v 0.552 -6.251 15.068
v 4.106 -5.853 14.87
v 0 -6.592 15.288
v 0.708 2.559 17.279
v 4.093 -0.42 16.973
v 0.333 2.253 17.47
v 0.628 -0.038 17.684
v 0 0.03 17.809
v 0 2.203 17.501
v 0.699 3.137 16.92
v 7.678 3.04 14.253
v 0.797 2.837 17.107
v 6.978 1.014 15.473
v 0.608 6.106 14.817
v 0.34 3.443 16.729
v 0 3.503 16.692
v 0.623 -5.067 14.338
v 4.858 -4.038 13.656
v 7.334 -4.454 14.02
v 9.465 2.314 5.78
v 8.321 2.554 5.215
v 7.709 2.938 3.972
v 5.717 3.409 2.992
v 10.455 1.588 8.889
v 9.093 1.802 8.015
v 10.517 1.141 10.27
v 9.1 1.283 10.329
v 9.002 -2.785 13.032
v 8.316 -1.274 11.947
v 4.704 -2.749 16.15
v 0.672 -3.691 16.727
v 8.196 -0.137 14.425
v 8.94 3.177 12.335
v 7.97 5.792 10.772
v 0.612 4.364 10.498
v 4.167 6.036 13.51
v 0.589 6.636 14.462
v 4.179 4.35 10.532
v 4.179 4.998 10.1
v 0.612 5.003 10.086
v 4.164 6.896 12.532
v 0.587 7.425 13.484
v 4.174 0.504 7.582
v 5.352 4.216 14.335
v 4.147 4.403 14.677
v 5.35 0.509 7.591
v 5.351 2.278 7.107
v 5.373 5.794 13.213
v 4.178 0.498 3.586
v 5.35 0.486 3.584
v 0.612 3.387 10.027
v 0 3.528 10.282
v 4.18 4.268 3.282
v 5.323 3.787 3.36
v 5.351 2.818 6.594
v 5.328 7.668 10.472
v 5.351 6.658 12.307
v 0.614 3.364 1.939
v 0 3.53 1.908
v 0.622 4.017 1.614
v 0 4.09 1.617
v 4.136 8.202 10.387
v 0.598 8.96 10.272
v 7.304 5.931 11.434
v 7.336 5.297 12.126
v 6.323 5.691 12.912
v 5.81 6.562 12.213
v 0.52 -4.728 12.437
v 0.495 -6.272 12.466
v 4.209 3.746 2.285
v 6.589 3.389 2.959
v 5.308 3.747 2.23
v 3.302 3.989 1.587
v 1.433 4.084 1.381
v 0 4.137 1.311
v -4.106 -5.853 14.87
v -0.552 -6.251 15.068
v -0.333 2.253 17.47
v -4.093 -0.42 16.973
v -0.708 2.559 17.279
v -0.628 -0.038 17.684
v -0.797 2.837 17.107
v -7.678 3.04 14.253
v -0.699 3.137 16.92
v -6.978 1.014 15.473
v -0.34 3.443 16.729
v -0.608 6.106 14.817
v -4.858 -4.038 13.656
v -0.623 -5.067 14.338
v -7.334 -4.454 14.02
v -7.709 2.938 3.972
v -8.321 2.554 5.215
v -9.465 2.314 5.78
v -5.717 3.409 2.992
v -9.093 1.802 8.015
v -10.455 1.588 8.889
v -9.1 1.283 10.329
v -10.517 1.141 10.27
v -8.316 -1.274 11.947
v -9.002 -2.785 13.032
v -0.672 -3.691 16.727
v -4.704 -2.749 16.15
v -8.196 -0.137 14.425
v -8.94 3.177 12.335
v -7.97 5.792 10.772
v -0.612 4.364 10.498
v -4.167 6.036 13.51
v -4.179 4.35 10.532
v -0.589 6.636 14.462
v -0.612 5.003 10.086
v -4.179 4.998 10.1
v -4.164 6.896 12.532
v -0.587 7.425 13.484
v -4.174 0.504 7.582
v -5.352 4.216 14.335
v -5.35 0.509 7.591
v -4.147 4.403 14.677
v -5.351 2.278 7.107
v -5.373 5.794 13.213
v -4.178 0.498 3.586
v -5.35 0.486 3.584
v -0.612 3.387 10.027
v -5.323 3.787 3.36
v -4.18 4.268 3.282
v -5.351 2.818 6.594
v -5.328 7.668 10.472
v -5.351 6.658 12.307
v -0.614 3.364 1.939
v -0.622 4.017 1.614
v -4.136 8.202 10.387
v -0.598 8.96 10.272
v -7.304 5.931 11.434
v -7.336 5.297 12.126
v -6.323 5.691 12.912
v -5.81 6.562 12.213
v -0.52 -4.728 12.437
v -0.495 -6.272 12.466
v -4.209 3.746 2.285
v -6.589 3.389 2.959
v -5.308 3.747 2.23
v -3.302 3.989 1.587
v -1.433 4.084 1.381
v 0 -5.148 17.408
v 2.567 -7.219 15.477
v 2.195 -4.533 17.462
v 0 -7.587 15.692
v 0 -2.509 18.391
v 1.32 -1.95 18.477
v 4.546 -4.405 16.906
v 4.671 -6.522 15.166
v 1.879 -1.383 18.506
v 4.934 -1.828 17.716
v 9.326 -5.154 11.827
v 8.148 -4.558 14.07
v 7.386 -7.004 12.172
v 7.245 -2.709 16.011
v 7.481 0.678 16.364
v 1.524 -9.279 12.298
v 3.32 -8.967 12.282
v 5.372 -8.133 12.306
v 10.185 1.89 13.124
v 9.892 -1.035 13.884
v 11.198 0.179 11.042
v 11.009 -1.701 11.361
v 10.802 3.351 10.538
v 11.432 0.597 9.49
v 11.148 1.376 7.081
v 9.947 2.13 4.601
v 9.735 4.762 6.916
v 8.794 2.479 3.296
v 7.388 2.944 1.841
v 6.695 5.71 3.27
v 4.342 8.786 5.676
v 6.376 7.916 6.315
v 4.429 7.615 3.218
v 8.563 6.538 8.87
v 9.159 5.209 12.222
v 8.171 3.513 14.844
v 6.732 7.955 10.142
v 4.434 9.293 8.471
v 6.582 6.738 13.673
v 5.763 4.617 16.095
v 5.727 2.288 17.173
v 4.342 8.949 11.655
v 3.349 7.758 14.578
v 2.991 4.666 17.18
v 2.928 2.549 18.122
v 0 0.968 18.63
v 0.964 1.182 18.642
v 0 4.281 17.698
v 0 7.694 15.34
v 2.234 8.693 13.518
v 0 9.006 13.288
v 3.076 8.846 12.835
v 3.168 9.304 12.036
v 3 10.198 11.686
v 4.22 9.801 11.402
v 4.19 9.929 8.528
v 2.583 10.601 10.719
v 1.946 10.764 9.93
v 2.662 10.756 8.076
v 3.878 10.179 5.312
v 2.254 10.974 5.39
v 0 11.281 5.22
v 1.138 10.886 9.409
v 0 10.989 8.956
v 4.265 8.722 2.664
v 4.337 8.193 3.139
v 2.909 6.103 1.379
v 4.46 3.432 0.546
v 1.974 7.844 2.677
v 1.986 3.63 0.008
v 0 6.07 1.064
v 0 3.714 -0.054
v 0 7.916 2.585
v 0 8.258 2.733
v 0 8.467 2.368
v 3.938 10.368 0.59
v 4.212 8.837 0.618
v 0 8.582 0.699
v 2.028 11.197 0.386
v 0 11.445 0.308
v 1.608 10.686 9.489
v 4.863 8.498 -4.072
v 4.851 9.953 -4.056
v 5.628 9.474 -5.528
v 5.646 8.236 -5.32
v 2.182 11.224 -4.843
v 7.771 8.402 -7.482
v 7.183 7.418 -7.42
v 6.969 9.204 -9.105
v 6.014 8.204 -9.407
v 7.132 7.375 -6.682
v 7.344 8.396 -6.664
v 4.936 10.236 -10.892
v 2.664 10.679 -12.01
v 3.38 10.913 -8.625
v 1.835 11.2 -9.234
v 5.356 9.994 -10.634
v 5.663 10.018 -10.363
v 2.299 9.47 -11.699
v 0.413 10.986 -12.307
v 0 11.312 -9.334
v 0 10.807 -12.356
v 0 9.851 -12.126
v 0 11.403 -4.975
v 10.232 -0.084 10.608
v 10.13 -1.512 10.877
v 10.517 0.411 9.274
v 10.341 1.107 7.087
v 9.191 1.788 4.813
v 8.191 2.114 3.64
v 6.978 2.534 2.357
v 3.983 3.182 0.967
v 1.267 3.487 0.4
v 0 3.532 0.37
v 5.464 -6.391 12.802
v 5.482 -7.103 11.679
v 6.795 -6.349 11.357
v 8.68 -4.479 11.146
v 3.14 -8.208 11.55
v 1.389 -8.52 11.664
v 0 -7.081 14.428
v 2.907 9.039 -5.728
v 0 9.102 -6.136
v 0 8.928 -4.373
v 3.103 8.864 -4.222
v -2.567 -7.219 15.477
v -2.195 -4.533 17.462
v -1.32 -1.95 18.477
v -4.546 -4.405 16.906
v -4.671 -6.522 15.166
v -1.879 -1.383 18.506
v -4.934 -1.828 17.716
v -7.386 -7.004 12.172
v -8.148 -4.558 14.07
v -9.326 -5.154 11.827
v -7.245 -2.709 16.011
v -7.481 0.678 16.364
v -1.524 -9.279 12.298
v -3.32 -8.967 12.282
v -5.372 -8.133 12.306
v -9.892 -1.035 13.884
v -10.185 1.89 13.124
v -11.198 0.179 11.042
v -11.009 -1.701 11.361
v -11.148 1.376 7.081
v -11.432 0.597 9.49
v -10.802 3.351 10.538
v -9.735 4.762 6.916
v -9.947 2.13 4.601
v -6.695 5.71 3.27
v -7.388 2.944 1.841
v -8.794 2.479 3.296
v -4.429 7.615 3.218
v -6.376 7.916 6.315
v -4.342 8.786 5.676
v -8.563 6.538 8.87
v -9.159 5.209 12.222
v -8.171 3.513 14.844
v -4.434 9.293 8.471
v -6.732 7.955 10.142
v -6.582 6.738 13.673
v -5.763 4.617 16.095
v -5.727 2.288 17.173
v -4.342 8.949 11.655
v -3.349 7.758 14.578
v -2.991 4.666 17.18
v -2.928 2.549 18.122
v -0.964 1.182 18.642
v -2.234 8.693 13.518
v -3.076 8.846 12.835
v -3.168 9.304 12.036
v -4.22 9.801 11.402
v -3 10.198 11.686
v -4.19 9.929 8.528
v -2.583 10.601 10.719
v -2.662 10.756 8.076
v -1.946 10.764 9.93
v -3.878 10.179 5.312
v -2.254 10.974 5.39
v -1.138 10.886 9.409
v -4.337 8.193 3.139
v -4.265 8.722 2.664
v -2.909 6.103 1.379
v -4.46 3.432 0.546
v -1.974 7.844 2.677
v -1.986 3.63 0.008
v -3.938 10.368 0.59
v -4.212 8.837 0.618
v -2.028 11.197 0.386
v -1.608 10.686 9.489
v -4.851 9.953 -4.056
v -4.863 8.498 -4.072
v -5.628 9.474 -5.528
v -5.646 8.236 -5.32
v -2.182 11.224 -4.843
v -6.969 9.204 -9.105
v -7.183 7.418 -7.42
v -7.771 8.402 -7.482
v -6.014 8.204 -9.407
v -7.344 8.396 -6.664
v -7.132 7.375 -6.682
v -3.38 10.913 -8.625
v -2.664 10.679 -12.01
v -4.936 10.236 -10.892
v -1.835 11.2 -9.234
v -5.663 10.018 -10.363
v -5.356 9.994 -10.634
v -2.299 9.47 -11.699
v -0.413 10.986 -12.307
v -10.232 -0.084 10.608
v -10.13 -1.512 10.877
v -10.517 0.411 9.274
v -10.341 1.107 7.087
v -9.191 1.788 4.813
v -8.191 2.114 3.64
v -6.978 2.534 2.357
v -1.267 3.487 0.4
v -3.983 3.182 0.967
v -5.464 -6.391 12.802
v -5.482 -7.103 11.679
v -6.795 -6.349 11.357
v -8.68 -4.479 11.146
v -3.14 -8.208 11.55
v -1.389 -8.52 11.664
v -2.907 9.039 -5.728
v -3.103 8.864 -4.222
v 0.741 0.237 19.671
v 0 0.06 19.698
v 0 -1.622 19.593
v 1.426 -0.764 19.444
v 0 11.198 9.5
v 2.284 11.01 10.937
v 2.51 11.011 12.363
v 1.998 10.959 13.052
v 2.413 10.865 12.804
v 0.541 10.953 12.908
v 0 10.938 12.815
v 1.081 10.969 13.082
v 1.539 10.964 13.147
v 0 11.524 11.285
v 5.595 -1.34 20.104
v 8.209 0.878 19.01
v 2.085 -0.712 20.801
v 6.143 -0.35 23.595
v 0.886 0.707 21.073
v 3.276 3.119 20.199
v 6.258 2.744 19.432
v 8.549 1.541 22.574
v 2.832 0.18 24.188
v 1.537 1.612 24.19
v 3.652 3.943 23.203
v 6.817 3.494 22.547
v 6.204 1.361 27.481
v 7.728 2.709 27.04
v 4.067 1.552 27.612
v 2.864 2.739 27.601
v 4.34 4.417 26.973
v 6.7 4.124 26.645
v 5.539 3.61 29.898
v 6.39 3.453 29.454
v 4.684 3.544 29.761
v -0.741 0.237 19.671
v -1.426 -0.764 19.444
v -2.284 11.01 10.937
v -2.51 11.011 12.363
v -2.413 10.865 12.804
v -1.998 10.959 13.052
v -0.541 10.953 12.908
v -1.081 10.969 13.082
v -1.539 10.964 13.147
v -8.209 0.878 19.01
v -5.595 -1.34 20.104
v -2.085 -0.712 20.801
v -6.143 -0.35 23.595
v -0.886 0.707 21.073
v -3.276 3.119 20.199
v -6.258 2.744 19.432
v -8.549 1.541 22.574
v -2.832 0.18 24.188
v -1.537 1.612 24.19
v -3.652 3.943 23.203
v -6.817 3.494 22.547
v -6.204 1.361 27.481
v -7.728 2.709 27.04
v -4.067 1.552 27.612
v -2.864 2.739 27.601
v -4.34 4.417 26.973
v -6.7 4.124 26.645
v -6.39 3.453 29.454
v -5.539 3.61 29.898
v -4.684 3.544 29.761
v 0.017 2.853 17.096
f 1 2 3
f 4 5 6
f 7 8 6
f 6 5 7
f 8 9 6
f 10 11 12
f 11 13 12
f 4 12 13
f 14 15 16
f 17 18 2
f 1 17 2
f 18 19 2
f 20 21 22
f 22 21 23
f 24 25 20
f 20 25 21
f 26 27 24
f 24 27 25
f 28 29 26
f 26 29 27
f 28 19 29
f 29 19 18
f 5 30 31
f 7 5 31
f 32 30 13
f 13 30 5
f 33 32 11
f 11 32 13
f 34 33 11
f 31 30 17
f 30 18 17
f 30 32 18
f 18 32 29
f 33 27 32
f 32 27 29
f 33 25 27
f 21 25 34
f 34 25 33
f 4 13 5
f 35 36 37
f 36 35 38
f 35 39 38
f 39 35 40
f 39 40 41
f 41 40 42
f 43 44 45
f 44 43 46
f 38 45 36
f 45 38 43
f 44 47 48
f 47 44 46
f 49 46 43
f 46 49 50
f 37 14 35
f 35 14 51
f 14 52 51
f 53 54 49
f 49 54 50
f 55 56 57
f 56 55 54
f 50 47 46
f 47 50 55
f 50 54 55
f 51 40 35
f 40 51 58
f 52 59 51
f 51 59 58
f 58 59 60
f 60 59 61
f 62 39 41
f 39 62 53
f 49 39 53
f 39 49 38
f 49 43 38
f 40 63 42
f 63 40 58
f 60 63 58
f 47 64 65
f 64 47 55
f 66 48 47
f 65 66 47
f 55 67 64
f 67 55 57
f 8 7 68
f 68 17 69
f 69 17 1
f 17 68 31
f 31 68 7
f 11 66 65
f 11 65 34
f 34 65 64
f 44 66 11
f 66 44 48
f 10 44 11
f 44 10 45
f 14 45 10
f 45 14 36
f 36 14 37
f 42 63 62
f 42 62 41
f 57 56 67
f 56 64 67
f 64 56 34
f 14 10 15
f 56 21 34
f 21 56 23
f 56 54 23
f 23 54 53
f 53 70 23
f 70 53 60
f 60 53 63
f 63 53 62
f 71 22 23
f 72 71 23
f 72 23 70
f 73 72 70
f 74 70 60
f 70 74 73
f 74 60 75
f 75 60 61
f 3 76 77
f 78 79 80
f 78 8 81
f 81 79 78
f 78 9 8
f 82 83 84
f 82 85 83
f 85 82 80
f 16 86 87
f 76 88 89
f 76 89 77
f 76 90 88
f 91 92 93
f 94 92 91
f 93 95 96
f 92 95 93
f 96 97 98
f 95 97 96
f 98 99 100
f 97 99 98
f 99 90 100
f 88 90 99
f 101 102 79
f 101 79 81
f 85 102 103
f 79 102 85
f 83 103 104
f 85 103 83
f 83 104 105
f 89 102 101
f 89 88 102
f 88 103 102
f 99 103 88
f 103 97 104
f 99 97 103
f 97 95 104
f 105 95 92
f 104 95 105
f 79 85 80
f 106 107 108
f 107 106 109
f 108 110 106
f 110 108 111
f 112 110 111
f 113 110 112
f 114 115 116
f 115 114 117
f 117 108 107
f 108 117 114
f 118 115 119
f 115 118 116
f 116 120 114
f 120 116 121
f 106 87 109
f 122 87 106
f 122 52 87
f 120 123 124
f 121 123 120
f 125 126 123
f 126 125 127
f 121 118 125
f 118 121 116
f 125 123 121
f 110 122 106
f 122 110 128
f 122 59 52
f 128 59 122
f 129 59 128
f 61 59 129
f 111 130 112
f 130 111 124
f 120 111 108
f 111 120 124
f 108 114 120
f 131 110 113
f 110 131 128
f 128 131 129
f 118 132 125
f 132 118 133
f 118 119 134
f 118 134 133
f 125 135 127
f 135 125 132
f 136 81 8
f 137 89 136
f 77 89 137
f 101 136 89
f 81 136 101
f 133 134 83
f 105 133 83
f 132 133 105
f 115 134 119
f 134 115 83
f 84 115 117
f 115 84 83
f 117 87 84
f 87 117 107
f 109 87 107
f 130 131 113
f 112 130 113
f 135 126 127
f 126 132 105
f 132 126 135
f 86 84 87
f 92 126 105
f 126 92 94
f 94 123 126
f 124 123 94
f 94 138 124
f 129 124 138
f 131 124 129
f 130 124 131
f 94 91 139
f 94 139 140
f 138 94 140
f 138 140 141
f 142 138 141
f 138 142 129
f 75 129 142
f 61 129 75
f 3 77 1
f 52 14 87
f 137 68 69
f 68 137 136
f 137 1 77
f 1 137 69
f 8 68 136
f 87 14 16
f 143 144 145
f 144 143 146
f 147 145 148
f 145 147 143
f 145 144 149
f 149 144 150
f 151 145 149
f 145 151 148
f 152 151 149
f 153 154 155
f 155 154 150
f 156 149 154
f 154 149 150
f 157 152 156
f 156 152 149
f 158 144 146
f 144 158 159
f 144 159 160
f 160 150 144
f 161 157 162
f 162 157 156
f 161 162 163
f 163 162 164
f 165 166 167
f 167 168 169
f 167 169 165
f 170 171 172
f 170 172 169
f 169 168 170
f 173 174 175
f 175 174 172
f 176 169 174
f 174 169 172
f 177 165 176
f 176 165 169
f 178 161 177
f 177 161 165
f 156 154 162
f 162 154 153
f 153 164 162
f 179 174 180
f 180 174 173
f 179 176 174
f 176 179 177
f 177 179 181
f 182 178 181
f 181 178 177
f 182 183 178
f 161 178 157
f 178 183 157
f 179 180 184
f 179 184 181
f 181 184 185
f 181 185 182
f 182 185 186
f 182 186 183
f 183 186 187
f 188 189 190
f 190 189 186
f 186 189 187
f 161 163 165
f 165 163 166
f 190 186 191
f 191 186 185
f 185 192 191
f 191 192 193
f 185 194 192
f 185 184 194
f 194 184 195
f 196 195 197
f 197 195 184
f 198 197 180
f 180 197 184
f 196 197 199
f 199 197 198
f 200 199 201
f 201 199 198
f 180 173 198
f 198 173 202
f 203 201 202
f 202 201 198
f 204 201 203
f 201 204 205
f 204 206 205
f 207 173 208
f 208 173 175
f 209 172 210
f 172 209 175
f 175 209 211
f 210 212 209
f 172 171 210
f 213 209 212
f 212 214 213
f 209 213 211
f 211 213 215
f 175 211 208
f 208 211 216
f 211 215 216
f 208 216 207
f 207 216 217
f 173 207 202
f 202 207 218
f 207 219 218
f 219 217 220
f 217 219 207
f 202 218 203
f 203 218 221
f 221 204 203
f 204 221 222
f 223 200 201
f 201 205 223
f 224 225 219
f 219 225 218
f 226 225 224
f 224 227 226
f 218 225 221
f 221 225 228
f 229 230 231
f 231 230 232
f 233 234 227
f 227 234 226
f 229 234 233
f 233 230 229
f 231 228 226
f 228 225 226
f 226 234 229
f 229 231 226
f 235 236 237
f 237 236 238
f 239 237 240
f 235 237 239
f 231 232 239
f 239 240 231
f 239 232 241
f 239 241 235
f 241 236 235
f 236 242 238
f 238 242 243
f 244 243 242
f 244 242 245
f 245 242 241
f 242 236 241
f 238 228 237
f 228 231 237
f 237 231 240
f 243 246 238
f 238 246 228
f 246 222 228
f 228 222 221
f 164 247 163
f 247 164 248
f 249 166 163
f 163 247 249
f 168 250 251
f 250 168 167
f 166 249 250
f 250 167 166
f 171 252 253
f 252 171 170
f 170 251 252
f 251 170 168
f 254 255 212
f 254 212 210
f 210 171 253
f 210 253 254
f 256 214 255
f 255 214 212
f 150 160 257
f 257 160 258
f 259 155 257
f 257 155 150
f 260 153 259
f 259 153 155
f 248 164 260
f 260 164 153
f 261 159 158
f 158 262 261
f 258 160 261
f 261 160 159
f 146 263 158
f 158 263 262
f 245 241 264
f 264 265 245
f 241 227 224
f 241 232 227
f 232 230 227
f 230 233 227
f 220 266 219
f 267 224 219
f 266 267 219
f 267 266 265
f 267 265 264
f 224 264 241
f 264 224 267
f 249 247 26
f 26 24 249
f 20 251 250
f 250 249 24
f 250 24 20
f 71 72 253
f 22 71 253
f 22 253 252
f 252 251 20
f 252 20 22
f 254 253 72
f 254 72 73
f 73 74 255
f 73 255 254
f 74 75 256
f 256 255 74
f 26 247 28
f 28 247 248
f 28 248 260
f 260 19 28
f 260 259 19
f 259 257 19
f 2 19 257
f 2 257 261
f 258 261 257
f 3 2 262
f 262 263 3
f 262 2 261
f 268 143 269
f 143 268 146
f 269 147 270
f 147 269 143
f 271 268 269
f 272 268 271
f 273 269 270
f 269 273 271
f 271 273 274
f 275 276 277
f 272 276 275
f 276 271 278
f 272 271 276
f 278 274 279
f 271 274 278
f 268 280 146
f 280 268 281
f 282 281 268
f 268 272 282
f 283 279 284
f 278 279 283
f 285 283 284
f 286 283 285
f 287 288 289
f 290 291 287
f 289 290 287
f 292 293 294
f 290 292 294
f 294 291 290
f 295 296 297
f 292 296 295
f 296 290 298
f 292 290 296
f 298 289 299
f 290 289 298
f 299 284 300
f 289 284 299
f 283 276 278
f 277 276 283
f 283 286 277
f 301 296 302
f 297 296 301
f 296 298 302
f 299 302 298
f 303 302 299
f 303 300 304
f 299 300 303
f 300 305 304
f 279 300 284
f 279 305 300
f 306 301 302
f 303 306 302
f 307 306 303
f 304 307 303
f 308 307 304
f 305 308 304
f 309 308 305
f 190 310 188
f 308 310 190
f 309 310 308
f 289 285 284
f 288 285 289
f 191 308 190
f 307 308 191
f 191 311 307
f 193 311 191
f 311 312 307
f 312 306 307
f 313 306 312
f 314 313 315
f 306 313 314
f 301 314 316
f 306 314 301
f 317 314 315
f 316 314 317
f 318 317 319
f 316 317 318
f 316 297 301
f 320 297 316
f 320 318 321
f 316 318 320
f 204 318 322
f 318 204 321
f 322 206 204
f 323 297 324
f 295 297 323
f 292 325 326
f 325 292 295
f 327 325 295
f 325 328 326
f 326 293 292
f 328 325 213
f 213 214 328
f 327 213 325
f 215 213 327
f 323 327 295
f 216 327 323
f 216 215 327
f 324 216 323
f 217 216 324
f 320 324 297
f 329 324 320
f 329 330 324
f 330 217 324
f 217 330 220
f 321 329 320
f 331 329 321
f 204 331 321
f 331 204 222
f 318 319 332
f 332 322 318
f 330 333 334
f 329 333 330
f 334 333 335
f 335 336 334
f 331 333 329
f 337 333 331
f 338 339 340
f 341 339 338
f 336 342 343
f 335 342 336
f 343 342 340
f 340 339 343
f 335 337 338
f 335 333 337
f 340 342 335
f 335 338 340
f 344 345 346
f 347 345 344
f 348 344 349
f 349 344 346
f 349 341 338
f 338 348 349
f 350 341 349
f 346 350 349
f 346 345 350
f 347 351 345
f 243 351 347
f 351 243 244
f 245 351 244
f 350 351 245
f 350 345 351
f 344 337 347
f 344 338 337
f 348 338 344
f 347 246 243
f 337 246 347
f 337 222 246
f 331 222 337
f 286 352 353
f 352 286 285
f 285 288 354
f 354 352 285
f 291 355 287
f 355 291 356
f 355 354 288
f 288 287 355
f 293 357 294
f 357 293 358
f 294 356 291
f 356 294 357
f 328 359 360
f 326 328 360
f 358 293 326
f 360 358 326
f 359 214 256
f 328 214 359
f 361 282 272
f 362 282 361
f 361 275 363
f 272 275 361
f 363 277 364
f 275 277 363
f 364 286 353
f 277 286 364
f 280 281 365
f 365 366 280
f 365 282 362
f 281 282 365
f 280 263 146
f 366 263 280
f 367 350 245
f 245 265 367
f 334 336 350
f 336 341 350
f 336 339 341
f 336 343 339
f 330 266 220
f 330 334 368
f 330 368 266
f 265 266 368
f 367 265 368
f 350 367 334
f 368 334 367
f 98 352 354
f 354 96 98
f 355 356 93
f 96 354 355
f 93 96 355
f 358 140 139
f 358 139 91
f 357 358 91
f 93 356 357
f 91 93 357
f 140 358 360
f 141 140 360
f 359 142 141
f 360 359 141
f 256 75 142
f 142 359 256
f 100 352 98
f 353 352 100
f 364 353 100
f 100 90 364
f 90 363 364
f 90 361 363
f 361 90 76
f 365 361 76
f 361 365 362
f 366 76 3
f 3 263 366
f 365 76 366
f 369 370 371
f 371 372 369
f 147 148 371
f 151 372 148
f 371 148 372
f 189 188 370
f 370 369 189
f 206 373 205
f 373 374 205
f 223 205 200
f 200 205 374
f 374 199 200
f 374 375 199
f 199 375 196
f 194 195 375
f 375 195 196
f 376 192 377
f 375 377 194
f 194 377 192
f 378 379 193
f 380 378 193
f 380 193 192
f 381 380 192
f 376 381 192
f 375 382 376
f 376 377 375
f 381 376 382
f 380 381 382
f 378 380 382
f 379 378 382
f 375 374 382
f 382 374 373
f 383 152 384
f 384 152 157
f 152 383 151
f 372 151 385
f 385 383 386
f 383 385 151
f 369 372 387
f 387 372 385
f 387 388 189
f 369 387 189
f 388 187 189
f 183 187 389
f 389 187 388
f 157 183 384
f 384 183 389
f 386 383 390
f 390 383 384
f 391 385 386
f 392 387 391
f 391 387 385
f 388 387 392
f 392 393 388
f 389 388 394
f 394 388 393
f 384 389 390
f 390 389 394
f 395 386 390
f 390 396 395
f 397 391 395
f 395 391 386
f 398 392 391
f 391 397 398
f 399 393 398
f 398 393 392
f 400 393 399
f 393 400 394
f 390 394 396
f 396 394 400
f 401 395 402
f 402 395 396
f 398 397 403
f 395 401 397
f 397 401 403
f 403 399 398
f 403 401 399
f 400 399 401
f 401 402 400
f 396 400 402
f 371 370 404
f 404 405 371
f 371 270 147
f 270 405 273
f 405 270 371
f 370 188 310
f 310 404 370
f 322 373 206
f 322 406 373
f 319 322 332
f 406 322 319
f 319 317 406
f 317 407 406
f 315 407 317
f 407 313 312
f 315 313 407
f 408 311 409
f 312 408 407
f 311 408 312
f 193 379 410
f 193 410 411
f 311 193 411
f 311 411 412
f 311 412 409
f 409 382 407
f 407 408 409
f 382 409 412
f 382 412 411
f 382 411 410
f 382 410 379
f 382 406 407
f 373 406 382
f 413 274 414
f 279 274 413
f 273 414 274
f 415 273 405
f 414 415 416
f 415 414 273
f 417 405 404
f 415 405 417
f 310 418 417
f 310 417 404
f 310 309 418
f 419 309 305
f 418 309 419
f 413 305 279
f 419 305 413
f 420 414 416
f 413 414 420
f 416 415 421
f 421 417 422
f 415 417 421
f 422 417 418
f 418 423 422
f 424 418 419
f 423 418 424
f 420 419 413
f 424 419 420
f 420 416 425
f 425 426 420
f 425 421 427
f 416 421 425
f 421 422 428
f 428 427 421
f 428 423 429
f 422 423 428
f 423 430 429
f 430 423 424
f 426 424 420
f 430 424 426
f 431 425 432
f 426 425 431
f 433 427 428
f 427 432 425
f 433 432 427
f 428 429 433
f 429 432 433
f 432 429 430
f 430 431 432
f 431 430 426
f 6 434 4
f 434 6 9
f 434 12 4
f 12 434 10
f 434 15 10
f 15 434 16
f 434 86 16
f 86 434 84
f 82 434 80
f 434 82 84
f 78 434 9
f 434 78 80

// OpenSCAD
use <../lib.scad>
use <s/u9440s01.scad>
use <s/u9440s02.scad>
use <s/u9447s01.scad>
function ldraw_lib__u9440() = [
// 0 ~Minifig Hair Powerpuff Girls Blossom
// 0 Name: u9440.dat
// 0 Author: Magnus Forsberg [MagFors]
// 0 !LDRAW_ORG Part UPDATE 2023-05
// 0 !LICENSE Licensed under CC BY 4.0 : see CAreadme.txt
// 
// 0 BFC CERTIFY CCW
  [0,"BFC","CERTIFY"],
  [0,"BFC","CCW"],
// 
// 0 !HISTORY 2023-10-31 [OrionP] Official Update 2023-05
// 
// 
// 1 16 0 0 0 1 0 0 0 1 0 0 0 1 s\u9447s01.dat
  [1,16,0,0,0,1,0,0,0,1,0,0,0,1, ldraw_lib__s__u9447s01()],
// 1 16 0 0 0 1 0 0 0 1 0 0 0 1 s\u9440s01.dat
  [1,16,0,0,0,1,0,0,0,1,0,0,0,1, ldraw_lib__s__u9440s01()],
// 1 16 0 0 0 -1 0 0 0 1 0 0 0 1 s\u9440s01.dat
  [1,16,0,0,0,-1,0,0,0,1,0,0,0,1, ldraw_lib__s__u9440s01()],
// 1 16 0 0 0 1 0 0 0 1 0 0 0 1 s\u9440s02.dat
  [1,16,0,0,0,1,0,0,0,1,0,0,0,1, ldraw_lib__s__u9440s02()],
// 1 16 0 0 0 -1 0 0 0 1 0 0 0 1 s\u9440s02.dat
  [1,16,0,0,0,-1,0,0,0,1,0,0,0,1, ldraw_lib__s__u9440s02()],
// 
// 4 16 .833 -43.674 5.633 0 -43.753 5.507 .042 -42.741 7.1325 1.77 -43.198 6.398
  [4,16,.833,-43.674,5.633,0,-43.753,5.507,.042,-42.741,7.1325,1.77,-43.198,6.398],
// 4 16 1.993 -42.767 7.092 1.77 -43.198 6.398 .042 -42.741 7.1325 1.747 -42.299 7.842
  [4,16,1.993,-42.767,7.092,1.77,-43.198,6.398,.042,-42.741,7.1325,1.747,-42.299,7.842],
// 4 16 .85 -41.823 8.608 1.747 -42.299 7.842 .042 -42.741 7.1325 0 -41.729 8.758
  [4,16,.85,-41.823,8.608,1.747,-42.299,7.842,.042,-42.741,7.1325,0,-41.729,8.758],
// 4 16 -.85 -41.823 8.608 0 -41.729 8.758 .042 -42.741 7.1325 -1.747 -42.299 7.842
  [4,16,-.85,-41.823,8.608,0,-41.729,8.758,.042,-42.741,7.1325,-1.747,-42.299,7.842],
// 4 16 -1.993 -42.767 7.092 -1.747 -42.299 7.842 .042 -42.741 7.1325 -1.77 -43.198 6.398
  [4,16,-1.993,-42.767,7.092,-1.747,-42.299,7.842,.042,-42.741,7.1325,-1.77,-43.198,6.398],
// 4 16 -.833 -43.674 5.633 -1.77 -43.198 6.398 .042 -42.741 7.1325 0 -43.753 5.507
  [4,16,-.833,-43.674,5.633,-1.77,-43.198,6.398,.042,-42.741,7.1325,0,-43.753,5.507],
// 5 24 0 -41.729 8.758 -.85 -41.823 8.608 -1.435 -37.043 15.265 .042 -42.741 7.1325
  [5,24,0,-41.729,8.758,-.85,-41.823,8.608,-1.435,-37.043,15.265,.042,-42.741,7.1325],
// 5 24 -1.77 -43.198 6.398 -.833 -43.674 5.633 .042 -42.741 7.1325 -10.148 -42.433 -1.051
  [5,24,-1.77,-43.198,6.398,-.833,-43.674,5.633,.042,-42.741,7.1325,-10.148,-42.433,-1.051],
// 5 24 1.747 -42.299 7.842 .85 -41.823 8.608 .042 -42.741 7.1325 1.519 -37.043 15.265
  [5,24,1.747,-42.299,7.842,.85,-41.823,8.608,.042,-42.741,7.1325,1.519,-37.043,15.265],
// 5 24 -1.747 -42.299 7.842 -1.993 -42.767 7.092 .042 -42.741 7.1325 -19.11 -35.633 7.599
  [5,24,-1.747,-42.299,7.842,-1.993,-42.767,7.092,.042,-42.741,7.1325,-19.11,-35.633,7.599],
// 5 24 -1.993 -42.767 7.092 -1.77 -43.198 6.398 -1.747 -42.299 7.842 -17.36 -38.683 2.536
  [5,24,-1.993,-42.767,7.092,-1.77,-43.198,6.398,-1.747,-42.299,7.842,-17.36,-38.683,2.536],
// 5 24 .833 -43.674 5.633 1.77 -43.198 6.398 0 -43.753 5.507 10.232 -42.433 -1.051
  [5,24,.833,-43.674,5.633,1.77,-43.198,6.398,0,-43.753,5.507,10.232,-42.433,-1.051],
// 5 24 1.77 -43.198 6.398 1.993 -42.767 7.092 .042 -42.741 7.1325 17.444 -38.683 2.536
  [5,24,1.77,-43.198,6.398,1.993,-42.767,7.092,.042,-42.741,7.1325,17.444,-38.683,2.536],
// 5 24 .85 -41.823 8.608 0 -41.729 8.758 1.519 -37.043 15.265 1.747 -42.299 7.842
  [5,24,.85,-41.823,8.608,0,-41.729,8.758,1.519,-37.043,15.265,1.747,-42.299,7.842],
// 5 24 -.85 -41.823 8.608 -1.747 -42.299 7.842 -1.435 -37.043 15.265 0 -41.729 8.758
  [5,24,-.85,-41.823,8.608,-1.747,-42.299,7.842,-1.435,-37.043,15.265,0,-41.729,8.758],
// 5 24 -.833 -43.674 5.633 0 -43.753 5.507 -1.77 -43.198 6.398 0 -44.522 .075
  [5,24,-.833,-43.674,5.633,0,-43.753,5.507,-1.77,-43.198,6.398,0,-44.522,.075],
// 5 24 0 -43.753 5.507 .833 -43.674 5.633 0 -44.522 .075 .042 -42.741 7.1325
  [5,24,0,-43.753,5.507,.833,-43.674,5.633,0,-44.522,.075,.042,-42.741,7.1325],
// 5 24 1.993 -42.767 7.092 1.747 -42.299 7.842 1.77 -43.198 6.398 19.194 -35.633 7.599
  [5,24,1.993,-42.767,7.092,1.747,-42.299,7.842,1.77,-43.198,6.398,19.194,-35.633,7.599],
// 2 24 0 23.334 28.281 0 30.889 27.017
  [2,24,0,23.334,28.281,0,30.889,27.017],
// 2 24 0 -36.071 -17.703 0 -39.231 -18.968
  [2,24,0,-36.071,-17.703,0,-39.231,-18.968],
// 5 24 0 -45.978 -6.272 0 -43.521 -12.871 3.301 -46.192 -4.874 -3.301 -46.192 -4.874
  [5,24,0,-45.978,-6.272,0,-43.521,-12.871,3.301,-46.192,-4.874,-3.301,-46.192,-4.874],
// 5 24 0 -43.521 -12.871 0 -39.231 -18.968 5.487 -43.655 -11.333 -5.487 -43.655 -11.333
  [5,24,0,-43.521,-12.871,0,-39.231,-18.968,5.487,-43.655,-11.333,-5.487,-43.655,-11.333],
// 5 24 0 -44.245 10.702 0 -46.576 2.42 2.41 -46.605 2.955 -2.41 -46.605 2.955
  [5,24,0,-44.245,10.702,0,-46.576,2.42,2.41,-46.605,2.955,-2.41,-46.605,2.955],
// 5 24 0 -33.221 22.515 0 -38.35 19.234 5.585 -33.795 21.733 -5.585 -33.795 21.733
  [5,24,0,-33.221,22.515,0,-38.35,19.234,5.585,-33.795,21.733,-5.585,-33.795,21.733],
// 5 24 0 -38.35 19.234 0 -44.245 10.702 -7.478 -42.95 11.666 7.478 -42.95 11.666
  [5,24,0,-38.35,19.234,0,-44.245,10.702,-7.478,-42.95,11.666,7.478,-42.95,11.666],
// 5 24 0 -.769 28.612 0 -13.049 28.203 5.069 -.964 27.993 -5.069 -.964 27.993
  [5,24,0,-.769,28.612,0,-13.049,28.203,5.069,-.964,27.993,-5.069,-.964,27.993],
// 5 24 0 30.316 24.627 0 30.889 27.017 1.032 30.768 27.464 -1.032 30.768 27.464
  [5,24,0,30.316,24.627,0,30.889,27.017,1.032,30.768,27.464,-1.032,30.768,27.464],
// 5 24 0 -13.049 28.203 0 -22.389 27.473 2.845 -23.523 27.216 -2.845 -23.523 27.216
  [5,24,0,-13.049,28.203,0,-22.389,27.473,2.845,-23.523,27.216,-2.845,-23.523,27.216],
// 5 24 0 12.438 28.507 0 -.769 28.612 5.455 12.107 28.059 -5.455 12.107 28.059
  [5,24,0,12.438,28.507,0,-.769,28.612,5.455,12.107,28.059,-5.455,12.107,28.059],
// 5 24 0 -1.748 21.454 0 10.932 22.321 10.531 -1.546 22.093 -10.531 -1.546 22.093
  [5,24,0,-1.748,21.454,0,10.932,22.321,10.531,-1.546,22.093,-10.531,-1.546,22.093],
// 5 24 0 -5.921 21.168 0 -1.748 21.454 10.531 -1.546 22.093 -10.531 -1.546 22.093
  [5,24,0,-5.921,21.168,0,-1.748,21.454,10.531,-1.546,22.093,-10.531,-1.546,22.093],
// 5 24 0 -6.832 20.645 0 -5.921 21.168 10.663 -6.66 21.806 -10.663 -6.66 21.806
  [5,24,0,-6.832,20.645,0,-5.921,21.168,10.663,-6.66,21.806,-10.663,-6.66,21.806],
// 5 24 0 -6.462 19.791 0 -6.832 20.645 4.934 -6.692 19.611 -4.934 -6.692 19.611
  [5,24,0,-6.462,19.791,0,-6.832,20.645,4.934,-6.692,19.611,-4.934,-6.692,19.611],
// 5 24 0 -2.661 15.174 0 -6.462 19.791 -4.934 -6.692 19.611 4.934 -6.692 19.611
  [5,24,0,-2.661,15.174,0,-6.462,19.791,-4.934,-6.692,19.611,4.934,-6.692,19.611],
// 5 24 0 30.316 24.627 0 15.341 22.756 5.748 29.248 23.676 -5.748 29.248 23.676
  [5,24,0,30.316,24.627,0,15.341,22.756,5.748,29.248,23.676,-5.748,29.248,23.676],
// 5 24 0 23.334 28.281 0 12.438 28.507 4.587 23.086 28.001 -4.587 23.086 28.001
  [5,24,0,23.334,28.281,0,12.438,28.507,4.587,23.086,28.001,-4.587,23.086,28.001],
// 5 24 0 -.926 8.829 0 -3.278 10.342 -3.583 -3.453 10.211 3.583 -3.453 10.211
  [5,24,0,-.926,8.829,0,-3.278,10.342,-3.583,-3.453,10.211,3.583,-3.453,10.211],
// 5 24 0 -2.661 15.174 0 .135 9.286 4.966 -.019 9.074 -4.966 -.019 9.074
  [5,24,0,-2.661,15.174,0,.135,9.286,4.966,-.019,9.074,-4.966,-.019,9.074],
// 5 24 0 -36.071 -17.703 0 -38.22 -16.481 -3.472 -29.16 -21.299 3.472 -29.16 -21.299
  [5,24,0,-36.071,-17.703,0,-38.22,-16.481,-3.472,-29.16,-21.299,3.472,-29.16,-21.299],
// 5 24 0 15.341 22.756 0 10.932 22.321 -7.7585 10.556 22.161 7.7585 10.556 22.161
  [5,24,0,15.341,22.756,0,10.932,22.321,-7.7585,10.556,22.161,7.7585,10.556,22.161],
// 5 24 0 .135 9.286 0 -.926 8.829 -3.168 -1.001 8.718 3.168 -1.001 8.718
  [5,24,0,.135,9.286,0,-.926,8.829,-3.168,-1.001,8.718,3.168,-1.001,8.718],
];
module ldraw_lib__u9440(step=0, col=false, unit=2/5, alt=false, line=0.2, solid=!$preview)
    makepoly(ldraw_lib__u9440(), step=step, col=col, unit=unit, alt=alt, line=line, solid=solid);
ldraw_lib__u9440(line=0.2);
